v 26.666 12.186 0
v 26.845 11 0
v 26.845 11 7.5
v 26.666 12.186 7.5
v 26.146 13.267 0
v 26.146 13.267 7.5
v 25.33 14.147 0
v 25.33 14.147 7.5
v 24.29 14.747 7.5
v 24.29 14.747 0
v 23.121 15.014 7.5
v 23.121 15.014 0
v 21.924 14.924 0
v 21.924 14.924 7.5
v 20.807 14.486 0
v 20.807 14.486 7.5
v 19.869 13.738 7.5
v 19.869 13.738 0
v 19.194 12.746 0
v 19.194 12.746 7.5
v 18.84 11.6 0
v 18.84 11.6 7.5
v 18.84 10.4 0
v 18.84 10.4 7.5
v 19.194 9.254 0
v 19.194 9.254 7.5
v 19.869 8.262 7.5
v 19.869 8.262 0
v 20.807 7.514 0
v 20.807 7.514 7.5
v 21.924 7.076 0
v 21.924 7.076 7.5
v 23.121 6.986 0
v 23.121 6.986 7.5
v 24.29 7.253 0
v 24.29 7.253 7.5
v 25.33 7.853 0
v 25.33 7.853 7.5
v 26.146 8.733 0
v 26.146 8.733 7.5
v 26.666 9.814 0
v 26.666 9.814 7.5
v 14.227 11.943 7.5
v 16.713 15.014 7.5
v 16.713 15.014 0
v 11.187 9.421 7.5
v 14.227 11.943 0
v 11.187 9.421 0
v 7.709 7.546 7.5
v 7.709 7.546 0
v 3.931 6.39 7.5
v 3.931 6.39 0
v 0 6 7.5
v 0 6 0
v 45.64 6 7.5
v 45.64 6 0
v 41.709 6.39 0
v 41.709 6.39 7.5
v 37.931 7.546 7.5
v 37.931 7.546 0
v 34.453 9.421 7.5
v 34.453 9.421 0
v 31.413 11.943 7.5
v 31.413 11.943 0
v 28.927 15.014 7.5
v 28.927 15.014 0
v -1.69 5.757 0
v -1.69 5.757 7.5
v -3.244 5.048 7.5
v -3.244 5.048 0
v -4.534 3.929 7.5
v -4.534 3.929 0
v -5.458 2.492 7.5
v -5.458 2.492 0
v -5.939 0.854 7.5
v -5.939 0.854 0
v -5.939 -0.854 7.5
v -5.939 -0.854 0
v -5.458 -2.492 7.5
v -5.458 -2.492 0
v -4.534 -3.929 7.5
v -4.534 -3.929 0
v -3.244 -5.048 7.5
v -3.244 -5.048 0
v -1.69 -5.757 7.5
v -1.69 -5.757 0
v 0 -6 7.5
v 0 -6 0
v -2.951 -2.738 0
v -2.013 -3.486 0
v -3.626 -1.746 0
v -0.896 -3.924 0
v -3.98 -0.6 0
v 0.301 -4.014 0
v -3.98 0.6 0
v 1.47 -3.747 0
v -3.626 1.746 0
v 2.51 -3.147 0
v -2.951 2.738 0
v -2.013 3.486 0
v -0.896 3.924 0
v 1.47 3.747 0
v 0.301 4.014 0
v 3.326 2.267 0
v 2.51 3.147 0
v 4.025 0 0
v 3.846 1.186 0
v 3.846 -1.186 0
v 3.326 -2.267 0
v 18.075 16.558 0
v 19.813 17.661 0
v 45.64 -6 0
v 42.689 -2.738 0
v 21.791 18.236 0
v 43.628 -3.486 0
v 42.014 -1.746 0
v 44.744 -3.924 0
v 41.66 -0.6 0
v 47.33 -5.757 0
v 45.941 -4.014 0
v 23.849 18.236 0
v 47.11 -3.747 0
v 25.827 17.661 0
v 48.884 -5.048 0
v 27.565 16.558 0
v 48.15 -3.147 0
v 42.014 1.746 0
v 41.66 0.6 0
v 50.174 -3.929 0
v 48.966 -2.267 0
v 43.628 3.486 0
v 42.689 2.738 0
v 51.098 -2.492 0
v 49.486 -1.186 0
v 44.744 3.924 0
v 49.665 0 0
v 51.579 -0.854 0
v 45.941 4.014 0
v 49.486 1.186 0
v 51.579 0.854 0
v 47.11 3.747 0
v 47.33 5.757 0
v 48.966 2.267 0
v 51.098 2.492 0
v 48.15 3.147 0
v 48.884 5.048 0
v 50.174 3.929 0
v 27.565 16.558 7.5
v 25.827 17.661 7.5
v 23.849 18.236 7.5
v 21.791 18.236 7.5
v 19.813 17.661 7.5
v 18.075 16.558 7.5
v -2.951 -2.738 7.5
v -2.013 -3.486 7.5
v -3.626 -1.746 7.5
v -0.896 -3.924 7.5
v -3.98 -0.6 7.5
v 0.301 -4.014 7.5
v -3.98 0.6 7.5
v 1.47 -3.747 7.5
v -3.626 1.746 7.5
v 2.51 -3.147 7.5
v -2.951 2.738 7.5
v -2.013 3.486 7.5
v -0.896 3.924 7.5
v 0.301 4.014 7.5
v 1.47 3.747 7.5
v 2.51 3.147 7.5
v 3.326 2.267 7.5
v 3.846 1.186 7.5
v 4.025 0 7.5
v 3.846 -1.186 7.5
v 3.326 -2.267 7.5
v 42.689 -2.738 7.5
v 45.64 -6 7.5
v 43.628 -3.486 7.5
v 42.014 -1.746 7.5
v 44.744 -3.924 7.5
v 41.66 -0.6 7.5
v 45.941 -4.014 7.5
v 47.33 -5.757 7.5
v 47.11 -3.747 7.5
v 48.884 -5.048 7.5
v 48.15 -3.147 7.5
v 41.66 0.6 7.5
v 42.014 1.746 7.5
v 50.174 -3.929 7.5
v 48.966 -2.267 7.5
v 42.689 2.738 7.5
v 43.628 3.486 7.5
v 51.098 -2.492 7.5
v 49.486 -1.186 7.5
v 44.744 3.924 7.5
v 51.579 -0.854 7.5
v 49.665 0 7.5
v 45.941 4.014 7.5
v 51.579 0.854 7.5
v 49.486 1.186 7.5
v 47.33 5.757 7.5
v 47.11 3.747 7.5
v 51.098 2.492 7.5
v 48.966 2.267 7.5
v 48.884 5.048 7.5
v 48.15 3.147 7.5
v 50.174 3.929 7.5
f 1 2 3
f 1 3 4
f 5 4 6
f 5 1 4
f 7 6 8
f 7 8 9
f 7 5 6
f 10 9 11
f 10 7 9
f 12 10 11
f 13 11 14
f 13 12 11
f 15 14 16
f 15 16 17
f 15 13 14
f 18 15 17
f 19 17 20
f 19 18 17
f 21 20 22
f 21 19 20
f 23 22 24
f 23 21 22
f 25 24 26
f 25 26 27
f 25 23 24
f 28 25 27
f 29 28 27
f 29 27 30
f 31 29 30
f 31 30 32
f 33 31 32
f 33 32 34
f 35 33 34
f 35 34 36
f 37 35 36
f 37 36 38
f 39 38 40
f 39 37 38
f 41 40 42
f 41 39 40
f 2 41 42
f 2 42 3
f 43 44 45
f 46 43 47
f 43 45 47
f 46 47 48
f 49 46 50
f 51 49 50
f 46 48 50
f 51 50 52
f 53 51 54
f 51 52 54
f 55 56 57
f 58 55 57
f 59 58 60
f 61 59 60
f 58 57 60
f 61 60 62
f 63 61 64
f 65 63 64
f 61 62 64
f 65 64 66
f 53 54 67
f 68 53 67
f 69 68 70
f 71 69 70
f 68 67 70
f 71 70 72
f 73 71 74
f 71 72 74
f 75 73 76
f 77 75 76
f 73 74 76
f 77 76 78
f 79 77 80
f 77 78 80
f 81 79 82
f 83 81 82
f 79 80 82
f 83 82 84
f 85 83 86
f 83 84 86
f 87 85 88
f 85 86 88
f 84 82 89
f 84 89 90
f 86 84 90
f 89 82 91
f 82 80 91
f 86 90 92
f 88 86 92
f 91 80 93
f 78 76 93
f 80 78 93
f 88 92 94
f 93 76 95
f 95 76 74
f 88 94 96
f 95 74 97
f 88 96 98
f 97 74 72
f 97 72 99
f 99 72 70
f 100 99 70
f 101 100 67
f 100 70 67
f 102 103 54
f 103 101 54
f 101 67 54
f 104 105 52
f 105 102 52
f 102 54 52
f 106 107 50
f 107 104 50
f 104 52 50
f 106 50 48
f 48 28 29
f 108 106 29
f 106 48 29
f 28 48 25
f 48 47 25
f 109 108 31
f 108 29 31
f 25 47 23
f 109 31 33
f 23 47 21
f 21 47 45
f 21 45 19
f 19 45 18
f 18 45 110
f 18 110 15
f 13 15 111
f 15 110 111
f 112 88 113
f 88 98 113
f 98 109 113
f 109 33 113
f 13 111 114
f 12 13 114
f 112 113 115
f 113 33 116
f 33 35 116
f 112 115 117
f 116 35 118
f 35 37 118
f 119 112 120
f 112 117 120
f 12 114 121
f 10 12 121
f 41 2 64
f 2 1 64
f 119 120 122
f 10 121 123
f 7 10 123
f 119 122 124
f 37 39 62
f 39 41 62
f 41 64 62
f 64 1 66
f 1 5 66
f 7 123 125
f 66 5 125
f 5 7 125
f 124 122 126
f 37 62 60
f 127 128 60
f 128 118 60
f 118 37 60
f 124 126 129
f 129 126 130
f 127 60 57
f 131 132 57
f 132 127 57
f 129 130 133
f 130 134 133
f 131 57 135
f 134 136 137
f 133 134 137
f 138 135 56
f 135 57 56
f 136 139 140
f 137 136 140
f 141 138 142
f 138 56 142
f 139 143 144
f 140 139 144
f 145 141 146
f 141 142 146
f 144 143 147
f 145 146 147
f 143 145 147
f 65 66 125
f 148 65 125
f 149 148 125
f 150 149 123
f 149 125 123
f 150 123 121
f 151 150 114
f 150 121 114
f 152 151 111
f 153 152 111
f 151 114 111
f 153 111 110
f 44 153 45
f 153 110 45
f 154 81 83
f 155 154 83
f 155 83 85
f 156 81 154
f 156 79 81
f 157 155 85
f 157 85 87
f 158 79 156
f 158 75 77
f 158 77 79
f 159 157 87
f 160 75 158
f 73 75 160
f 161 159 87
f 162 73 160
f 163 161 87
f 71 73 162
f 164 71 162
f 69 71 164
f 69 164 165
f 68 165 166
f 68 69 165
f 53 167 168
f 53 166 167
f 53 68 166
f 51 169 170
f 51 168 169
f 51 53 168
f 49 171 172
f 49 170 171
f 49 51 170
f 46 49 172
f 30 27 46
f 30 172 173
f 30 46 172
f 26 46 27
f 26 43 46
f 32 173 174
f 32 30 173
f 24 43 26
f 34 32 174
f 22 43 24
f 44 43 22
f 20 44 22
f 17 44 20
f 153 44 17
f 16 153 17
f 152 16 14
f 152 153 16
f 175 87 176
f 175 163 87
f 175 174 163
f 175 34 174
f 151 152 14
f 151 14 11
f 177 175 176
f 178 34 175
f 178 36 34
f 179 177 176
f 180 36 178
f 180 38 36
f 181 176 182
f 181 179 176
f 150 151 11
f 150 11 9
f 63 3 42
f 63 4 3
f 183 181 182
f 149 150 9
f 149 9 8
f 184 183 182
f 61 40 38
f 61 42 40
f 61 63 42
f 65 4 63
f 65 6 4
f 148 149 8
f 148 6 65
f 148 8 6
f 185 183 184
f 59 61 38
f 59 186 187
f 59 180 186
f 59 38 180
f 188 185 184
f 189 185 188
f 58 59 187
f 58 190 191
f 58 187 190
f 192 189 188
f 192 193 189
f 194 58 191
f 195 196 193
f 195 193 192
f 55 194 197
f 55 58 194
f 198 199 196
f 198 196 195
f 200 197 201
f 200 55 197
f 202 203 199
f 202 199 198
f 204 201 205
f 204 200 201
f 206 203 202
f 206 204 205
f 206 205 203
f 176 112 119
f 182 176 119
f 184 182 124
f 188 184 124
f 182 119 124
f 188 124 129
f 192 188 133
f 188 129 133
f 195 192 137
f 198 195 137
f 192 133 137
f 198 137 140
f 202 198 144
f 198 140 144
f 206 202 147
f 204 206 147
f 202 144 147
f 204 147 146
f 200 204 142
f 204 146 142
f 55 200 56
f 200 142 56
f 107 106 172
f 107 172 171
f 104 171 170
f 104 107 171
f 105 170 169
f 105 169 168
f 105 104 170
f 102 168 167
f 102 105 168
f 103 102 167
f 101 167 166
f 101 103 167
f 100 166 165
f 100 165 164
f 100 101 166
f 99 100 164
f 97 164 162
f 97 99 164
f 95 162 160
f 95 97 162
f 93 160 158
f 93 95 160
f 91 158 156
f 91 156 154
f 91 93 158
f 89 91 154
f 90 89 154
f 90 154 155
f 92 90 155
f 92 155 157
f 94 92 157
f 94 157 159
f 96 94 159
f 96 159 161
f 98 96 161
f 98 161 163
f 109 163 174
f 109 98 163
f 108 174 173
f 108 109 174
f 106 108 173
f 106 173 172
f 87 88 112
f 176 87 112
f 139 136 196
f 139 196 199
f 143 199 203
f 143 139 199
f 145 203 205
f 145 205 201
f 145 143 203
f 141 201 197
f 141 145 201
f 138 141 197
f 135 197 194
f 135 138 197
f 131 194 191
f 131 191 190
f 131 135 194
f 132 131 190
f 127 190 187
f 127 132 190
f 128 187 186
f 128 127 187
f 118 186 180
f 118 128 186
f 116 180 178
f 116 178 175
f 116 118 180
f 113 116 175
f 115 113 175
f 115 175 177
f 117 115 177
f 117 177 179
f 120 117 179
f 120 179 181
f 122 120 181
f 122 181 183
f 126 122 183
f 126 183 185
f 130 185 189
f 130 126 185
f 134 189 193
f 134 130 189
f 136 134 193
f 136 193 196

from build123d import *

# Parameters (mm, degrees)
SKETCH1_R           = 4.025
BOSS_EXTRUDE1_DEPTH = 7.5


with BuildPart() as part:
    # Sketch1 → Boss-Extrude1 (new body)
    with BuildSketch(Plane.XY):
        with BuildLine():
            Line((0, -6), (45.64, -6))
            ThreePointArc((45.64, -6), (51.64, 0), (45.64, 6))
            ThreePointArc((45.64, 6), (36.145582493, 8.39727191), (28.927235025, 15.01439638))
            ThreePointArc((28.927235025, 15.01439638), (22.82, 18.308467551), (16.712764975, 15.01439638))
            ThreePointArc((16.712764975, 15.01439638), (9.494417507, 8.39727191), (0, 6))
            ThreePointArc((0, 6), (-6, 0), (0, -6))
        make_face()
        Circle(SKETCH1_R, mode=Mode.SUBTRACT)
        with Locations((45.64, 0)):
            Circle(SKETCH1_R, mode=Mode.SUBTRACT)
        with Locations((22.82, 11)):
            Circle(SKETCH1_R, mode=Mode.SUBTRACT)
    extrude(amount=BOSS_EXTRUDE1_DEPTH)


solid = part.part
